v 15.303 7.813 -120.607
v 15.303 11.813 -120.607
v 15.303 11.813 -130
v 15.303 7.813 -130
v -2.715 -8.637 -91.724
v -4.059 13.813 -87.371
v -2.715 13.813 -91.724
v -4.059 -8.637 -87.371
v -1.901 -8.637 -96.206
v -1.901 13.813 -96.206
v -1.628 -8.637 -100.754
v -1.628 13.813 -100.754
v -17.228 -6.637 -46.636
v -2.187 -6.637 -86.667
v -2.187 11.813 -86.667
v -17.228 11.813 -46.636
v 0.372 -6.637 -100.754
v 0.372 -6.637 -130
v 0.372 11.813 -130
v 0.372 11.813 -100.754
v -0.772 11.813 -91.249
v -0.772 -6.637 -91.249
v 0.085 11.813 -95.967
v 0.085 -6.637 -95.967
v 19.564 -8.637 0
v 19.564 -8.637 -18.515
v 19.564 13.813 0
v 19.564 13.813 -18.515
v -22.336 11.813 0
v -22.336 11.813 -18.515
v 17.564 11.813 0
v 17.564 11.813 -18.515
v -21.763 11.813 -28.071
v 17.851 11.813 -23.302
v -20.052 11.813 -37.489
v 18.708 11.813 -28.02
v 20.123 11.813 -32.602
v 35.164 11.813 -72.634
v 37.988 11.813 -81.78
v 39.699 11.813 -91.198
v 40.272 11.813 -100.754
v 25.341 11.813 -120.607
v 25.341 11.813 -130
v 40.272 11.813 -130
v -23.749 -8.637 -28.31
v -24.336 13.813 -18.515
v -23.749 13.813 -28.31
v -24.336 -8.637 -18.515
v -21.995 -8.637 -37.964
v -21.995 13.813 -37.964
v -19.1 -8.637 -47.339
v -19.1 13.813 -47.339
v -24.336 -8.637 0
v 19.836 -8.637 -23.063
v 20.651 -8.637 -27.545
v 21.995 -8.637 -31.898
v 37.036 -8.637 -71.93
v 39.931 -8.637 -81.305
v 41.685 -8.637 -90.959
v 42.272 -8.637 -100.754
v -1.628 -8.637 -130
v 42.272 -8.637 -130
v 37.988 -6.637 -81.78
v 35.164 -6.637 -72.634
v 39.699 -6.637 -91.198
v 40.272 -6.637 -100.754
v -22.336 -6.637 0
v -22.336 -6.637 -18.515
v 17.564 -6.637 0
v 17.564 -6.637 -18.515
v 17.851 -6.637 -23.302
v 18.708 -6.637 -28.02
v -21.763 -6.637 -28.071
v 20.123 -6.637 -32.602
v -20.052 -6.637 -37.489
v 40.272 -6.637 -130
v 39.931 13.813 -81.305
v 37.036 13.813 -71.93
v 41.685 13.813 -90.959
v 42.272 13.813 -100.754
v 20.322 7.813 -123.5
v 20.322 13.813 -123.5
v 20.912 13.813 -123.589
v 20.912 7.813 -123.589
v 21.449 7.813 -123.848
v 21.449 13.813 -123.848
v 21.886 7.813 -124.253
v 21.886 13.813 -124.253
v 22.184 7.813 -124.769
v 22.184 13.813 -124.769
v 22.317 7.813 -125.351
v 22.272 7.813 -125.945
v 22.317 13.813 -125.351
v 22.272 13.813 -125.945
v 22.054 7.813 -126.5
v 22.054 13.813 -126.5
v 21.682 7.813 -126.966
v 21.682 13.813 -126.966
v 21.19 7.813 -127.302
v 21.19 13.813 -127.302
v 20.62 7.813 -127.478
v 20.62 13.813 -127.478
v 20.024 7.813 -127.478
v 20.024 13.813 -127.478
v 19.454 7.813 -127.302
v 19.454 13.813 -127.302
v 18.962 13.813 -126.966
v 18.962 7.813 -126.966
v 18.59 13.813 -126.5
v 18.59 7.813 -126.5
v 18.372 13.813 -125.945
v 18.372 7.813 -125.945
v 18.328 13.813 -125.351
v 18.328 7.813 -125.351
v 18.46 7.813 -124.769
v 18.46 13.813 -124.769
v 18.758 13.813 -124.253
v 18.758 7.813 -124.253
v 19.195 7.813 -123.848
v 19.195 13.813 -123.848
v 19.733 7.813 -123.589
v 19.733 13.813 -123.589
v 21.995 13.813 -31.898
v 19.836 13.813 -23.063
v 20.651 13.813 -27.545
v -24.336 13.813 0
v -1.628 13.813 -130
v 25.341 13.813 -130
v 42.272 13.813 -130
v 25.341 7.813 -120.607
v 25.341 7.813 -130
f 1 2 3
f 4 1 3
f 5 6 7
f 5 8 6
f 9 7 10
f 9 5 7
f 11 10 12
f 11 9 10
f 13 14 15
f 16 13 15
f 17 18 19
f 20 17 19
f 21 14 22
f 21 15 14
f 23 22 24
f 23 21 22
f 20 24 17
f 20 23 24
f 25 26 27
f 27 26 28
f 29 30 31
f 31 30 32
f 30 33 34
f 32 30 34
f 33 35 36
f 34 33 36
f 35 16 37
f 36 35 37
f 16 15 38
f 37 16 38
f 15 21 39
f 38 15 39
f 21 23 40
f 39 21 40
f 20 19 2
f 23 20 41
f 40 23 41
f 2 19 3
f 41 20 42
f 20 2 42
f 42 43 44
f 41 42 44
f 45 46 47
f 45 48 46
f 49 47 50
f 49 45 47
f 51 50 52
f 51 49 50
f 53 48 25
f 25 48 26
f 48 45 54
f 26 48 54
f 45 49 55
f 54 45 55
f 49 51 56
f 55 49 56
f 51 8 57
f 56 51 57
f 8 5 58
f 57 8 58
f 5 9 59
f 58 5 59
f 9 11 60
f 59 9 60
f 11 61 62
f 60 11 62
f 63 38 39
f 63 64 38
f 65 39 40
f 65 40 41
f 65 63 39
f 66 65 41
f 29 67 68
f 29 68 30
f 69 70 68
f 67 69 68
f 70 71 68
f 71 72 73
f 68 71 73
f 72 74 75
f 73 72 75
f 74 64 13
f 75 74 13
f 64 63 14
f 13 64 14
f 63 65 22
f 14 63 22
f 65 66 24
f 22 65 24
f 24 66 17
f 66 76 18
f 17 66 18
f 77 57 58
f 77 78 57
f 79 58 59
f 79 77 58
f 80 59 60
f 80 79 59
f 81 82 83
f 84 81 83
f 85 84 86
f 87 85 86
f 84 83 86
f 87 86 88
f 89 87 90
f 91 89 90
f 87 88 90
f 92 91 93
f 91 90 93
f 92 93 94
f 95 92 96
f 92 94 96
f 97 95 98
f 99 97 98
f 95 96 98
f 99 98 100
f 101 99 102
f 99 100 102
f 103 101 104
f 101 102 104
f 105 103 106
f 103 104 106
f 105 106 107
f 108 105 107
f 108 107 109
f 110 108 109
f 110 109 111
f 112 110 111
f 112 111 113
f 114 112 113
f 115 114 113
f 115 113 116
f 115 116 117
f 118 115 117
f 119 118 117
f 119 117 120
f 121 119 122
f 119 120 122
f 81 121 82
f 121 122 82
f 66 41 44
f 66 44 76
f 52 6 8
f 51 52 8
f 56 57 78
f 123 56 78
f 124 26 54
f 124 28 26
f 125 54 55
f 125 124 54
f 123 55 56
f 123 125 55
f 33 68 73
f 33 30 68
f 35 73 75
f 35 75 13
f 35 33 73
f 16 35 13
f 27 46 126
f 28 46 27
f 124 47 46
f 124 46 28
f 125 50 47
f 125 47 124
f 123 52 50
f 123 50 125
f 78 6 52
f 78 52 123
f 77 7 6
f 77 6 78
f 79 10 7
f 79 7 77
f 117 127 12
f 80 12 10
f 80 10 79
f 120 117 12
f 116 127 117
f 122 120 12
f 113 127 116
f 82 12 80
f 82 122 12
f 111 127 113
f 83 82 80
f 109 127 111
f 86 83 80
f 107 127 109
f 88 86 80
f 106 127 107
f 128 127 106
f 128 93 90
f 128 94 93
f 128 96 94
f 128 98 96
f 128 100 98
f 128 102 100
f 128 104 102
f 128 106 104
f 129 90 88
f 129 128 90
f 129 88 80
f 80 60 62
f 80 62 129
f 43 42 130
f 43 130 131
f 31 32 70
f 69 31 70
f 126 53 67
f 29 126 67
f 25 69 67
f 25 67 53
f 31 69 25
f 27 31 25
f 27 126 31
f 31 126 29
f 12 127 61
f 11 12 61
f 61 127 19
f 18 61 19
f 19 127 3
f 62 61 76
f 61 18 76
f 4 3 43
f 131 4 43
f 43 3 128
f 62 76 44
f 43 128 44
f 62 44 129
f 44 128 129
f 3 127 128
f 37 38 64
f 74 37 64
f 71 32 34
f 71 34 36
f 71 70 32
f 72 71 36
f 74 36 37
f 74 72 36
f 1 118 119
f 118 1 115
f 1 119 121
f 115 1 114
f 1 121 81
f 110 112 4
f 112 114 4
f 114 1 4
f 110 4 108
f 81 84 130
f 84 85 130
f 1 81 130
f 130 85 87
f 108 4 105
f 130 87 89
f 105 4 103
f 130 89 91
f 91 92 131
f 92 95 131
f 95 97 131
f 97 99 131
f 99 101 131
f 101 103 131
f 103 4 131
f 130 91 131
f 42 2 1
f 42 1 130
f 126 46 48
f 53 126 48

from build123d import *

# Parameters (mm, degrees)
SKETCH1_W           = 43.9
SKETCH1_H           = 22.45
SKETCH1_W_2         = 39.9
SKETCH1_H_2         = 18.45
SKETCH4_W           = 10.037411494
SKETCH4_H           = 9.392939089
BOSS_EXTRUDE2_DEPTH = 6
SKETCH4_3_R         = 2
CUT_EXTRUDE1_DEPTH  = 6


with BuildPart() as part:
    # Sweep1: sweep along a path in Sketch3
    with BuildLine(Plane(origin=(0, 0, 0), x_dir=(1, 0, 0), z_dir=(0, 1, 0))) as sweep1_path:
        Line((-2.386481251, 0), (-2.386481251, 18.515328192))
        ThreePointArc((-2.386481251, 18.515328192), (-1.420266616, 29.239701623), (1.447258265, 39.618673501))
        Line((1.447258265, 39.618673501), (16.488375541, 79.650398262))
        ThreePointArc((16.488375541, 79.650398262), (19.355900422, 90.02937014), (20.322115057, 100.753743571))
        Line((20.322115057, 100.753743571), (20.322115057, 130))
    # Sketch1 → Sweep1 (sweep)
    with BuildSketch(Plane.XY):
        with Locations((-2.386481251, 2.5875622)):
            Rectangle(SKETCH1_W, SKETCH1_H)
        with Locations((-2.386481251, 2.5875622)):
            Rectangle(SKETCH1_W_2, SKETCH1_H_2, mode=Mode.SUBTRACT)
    sweep(path=sweep1_path.line)

    # Sketch4 → Boss-Extrude2 (add)
    with BuildSketch(Plane(origin=(0, 13.8125622, 0), x_dir=(1, 0, 0), z_dir=(0, 1, 0))):
        with Locations((20.322115057, 125.303530456)):
            Rectangle(SKETCH4_W, SKETCH4_H)
    extrude(amount=-BOSS_EXTRUDE2_DEPTH)

    # Sketch4<3> → Cut-Extrude1 (cut)
    with BuildSketch(Plane(origin=(0, 13.8125622, 0), x_dir=(1, 0, 0), z_dir=(0, 1, 0))):
        with Locations((20.322115057, 125.5)):
            Circle(SKETCH4_3_R)
    extrude(amount=-CUT_EXTRUDE1_DEPTH, mode=Mode.SUBTRACT)


solid = part.part
